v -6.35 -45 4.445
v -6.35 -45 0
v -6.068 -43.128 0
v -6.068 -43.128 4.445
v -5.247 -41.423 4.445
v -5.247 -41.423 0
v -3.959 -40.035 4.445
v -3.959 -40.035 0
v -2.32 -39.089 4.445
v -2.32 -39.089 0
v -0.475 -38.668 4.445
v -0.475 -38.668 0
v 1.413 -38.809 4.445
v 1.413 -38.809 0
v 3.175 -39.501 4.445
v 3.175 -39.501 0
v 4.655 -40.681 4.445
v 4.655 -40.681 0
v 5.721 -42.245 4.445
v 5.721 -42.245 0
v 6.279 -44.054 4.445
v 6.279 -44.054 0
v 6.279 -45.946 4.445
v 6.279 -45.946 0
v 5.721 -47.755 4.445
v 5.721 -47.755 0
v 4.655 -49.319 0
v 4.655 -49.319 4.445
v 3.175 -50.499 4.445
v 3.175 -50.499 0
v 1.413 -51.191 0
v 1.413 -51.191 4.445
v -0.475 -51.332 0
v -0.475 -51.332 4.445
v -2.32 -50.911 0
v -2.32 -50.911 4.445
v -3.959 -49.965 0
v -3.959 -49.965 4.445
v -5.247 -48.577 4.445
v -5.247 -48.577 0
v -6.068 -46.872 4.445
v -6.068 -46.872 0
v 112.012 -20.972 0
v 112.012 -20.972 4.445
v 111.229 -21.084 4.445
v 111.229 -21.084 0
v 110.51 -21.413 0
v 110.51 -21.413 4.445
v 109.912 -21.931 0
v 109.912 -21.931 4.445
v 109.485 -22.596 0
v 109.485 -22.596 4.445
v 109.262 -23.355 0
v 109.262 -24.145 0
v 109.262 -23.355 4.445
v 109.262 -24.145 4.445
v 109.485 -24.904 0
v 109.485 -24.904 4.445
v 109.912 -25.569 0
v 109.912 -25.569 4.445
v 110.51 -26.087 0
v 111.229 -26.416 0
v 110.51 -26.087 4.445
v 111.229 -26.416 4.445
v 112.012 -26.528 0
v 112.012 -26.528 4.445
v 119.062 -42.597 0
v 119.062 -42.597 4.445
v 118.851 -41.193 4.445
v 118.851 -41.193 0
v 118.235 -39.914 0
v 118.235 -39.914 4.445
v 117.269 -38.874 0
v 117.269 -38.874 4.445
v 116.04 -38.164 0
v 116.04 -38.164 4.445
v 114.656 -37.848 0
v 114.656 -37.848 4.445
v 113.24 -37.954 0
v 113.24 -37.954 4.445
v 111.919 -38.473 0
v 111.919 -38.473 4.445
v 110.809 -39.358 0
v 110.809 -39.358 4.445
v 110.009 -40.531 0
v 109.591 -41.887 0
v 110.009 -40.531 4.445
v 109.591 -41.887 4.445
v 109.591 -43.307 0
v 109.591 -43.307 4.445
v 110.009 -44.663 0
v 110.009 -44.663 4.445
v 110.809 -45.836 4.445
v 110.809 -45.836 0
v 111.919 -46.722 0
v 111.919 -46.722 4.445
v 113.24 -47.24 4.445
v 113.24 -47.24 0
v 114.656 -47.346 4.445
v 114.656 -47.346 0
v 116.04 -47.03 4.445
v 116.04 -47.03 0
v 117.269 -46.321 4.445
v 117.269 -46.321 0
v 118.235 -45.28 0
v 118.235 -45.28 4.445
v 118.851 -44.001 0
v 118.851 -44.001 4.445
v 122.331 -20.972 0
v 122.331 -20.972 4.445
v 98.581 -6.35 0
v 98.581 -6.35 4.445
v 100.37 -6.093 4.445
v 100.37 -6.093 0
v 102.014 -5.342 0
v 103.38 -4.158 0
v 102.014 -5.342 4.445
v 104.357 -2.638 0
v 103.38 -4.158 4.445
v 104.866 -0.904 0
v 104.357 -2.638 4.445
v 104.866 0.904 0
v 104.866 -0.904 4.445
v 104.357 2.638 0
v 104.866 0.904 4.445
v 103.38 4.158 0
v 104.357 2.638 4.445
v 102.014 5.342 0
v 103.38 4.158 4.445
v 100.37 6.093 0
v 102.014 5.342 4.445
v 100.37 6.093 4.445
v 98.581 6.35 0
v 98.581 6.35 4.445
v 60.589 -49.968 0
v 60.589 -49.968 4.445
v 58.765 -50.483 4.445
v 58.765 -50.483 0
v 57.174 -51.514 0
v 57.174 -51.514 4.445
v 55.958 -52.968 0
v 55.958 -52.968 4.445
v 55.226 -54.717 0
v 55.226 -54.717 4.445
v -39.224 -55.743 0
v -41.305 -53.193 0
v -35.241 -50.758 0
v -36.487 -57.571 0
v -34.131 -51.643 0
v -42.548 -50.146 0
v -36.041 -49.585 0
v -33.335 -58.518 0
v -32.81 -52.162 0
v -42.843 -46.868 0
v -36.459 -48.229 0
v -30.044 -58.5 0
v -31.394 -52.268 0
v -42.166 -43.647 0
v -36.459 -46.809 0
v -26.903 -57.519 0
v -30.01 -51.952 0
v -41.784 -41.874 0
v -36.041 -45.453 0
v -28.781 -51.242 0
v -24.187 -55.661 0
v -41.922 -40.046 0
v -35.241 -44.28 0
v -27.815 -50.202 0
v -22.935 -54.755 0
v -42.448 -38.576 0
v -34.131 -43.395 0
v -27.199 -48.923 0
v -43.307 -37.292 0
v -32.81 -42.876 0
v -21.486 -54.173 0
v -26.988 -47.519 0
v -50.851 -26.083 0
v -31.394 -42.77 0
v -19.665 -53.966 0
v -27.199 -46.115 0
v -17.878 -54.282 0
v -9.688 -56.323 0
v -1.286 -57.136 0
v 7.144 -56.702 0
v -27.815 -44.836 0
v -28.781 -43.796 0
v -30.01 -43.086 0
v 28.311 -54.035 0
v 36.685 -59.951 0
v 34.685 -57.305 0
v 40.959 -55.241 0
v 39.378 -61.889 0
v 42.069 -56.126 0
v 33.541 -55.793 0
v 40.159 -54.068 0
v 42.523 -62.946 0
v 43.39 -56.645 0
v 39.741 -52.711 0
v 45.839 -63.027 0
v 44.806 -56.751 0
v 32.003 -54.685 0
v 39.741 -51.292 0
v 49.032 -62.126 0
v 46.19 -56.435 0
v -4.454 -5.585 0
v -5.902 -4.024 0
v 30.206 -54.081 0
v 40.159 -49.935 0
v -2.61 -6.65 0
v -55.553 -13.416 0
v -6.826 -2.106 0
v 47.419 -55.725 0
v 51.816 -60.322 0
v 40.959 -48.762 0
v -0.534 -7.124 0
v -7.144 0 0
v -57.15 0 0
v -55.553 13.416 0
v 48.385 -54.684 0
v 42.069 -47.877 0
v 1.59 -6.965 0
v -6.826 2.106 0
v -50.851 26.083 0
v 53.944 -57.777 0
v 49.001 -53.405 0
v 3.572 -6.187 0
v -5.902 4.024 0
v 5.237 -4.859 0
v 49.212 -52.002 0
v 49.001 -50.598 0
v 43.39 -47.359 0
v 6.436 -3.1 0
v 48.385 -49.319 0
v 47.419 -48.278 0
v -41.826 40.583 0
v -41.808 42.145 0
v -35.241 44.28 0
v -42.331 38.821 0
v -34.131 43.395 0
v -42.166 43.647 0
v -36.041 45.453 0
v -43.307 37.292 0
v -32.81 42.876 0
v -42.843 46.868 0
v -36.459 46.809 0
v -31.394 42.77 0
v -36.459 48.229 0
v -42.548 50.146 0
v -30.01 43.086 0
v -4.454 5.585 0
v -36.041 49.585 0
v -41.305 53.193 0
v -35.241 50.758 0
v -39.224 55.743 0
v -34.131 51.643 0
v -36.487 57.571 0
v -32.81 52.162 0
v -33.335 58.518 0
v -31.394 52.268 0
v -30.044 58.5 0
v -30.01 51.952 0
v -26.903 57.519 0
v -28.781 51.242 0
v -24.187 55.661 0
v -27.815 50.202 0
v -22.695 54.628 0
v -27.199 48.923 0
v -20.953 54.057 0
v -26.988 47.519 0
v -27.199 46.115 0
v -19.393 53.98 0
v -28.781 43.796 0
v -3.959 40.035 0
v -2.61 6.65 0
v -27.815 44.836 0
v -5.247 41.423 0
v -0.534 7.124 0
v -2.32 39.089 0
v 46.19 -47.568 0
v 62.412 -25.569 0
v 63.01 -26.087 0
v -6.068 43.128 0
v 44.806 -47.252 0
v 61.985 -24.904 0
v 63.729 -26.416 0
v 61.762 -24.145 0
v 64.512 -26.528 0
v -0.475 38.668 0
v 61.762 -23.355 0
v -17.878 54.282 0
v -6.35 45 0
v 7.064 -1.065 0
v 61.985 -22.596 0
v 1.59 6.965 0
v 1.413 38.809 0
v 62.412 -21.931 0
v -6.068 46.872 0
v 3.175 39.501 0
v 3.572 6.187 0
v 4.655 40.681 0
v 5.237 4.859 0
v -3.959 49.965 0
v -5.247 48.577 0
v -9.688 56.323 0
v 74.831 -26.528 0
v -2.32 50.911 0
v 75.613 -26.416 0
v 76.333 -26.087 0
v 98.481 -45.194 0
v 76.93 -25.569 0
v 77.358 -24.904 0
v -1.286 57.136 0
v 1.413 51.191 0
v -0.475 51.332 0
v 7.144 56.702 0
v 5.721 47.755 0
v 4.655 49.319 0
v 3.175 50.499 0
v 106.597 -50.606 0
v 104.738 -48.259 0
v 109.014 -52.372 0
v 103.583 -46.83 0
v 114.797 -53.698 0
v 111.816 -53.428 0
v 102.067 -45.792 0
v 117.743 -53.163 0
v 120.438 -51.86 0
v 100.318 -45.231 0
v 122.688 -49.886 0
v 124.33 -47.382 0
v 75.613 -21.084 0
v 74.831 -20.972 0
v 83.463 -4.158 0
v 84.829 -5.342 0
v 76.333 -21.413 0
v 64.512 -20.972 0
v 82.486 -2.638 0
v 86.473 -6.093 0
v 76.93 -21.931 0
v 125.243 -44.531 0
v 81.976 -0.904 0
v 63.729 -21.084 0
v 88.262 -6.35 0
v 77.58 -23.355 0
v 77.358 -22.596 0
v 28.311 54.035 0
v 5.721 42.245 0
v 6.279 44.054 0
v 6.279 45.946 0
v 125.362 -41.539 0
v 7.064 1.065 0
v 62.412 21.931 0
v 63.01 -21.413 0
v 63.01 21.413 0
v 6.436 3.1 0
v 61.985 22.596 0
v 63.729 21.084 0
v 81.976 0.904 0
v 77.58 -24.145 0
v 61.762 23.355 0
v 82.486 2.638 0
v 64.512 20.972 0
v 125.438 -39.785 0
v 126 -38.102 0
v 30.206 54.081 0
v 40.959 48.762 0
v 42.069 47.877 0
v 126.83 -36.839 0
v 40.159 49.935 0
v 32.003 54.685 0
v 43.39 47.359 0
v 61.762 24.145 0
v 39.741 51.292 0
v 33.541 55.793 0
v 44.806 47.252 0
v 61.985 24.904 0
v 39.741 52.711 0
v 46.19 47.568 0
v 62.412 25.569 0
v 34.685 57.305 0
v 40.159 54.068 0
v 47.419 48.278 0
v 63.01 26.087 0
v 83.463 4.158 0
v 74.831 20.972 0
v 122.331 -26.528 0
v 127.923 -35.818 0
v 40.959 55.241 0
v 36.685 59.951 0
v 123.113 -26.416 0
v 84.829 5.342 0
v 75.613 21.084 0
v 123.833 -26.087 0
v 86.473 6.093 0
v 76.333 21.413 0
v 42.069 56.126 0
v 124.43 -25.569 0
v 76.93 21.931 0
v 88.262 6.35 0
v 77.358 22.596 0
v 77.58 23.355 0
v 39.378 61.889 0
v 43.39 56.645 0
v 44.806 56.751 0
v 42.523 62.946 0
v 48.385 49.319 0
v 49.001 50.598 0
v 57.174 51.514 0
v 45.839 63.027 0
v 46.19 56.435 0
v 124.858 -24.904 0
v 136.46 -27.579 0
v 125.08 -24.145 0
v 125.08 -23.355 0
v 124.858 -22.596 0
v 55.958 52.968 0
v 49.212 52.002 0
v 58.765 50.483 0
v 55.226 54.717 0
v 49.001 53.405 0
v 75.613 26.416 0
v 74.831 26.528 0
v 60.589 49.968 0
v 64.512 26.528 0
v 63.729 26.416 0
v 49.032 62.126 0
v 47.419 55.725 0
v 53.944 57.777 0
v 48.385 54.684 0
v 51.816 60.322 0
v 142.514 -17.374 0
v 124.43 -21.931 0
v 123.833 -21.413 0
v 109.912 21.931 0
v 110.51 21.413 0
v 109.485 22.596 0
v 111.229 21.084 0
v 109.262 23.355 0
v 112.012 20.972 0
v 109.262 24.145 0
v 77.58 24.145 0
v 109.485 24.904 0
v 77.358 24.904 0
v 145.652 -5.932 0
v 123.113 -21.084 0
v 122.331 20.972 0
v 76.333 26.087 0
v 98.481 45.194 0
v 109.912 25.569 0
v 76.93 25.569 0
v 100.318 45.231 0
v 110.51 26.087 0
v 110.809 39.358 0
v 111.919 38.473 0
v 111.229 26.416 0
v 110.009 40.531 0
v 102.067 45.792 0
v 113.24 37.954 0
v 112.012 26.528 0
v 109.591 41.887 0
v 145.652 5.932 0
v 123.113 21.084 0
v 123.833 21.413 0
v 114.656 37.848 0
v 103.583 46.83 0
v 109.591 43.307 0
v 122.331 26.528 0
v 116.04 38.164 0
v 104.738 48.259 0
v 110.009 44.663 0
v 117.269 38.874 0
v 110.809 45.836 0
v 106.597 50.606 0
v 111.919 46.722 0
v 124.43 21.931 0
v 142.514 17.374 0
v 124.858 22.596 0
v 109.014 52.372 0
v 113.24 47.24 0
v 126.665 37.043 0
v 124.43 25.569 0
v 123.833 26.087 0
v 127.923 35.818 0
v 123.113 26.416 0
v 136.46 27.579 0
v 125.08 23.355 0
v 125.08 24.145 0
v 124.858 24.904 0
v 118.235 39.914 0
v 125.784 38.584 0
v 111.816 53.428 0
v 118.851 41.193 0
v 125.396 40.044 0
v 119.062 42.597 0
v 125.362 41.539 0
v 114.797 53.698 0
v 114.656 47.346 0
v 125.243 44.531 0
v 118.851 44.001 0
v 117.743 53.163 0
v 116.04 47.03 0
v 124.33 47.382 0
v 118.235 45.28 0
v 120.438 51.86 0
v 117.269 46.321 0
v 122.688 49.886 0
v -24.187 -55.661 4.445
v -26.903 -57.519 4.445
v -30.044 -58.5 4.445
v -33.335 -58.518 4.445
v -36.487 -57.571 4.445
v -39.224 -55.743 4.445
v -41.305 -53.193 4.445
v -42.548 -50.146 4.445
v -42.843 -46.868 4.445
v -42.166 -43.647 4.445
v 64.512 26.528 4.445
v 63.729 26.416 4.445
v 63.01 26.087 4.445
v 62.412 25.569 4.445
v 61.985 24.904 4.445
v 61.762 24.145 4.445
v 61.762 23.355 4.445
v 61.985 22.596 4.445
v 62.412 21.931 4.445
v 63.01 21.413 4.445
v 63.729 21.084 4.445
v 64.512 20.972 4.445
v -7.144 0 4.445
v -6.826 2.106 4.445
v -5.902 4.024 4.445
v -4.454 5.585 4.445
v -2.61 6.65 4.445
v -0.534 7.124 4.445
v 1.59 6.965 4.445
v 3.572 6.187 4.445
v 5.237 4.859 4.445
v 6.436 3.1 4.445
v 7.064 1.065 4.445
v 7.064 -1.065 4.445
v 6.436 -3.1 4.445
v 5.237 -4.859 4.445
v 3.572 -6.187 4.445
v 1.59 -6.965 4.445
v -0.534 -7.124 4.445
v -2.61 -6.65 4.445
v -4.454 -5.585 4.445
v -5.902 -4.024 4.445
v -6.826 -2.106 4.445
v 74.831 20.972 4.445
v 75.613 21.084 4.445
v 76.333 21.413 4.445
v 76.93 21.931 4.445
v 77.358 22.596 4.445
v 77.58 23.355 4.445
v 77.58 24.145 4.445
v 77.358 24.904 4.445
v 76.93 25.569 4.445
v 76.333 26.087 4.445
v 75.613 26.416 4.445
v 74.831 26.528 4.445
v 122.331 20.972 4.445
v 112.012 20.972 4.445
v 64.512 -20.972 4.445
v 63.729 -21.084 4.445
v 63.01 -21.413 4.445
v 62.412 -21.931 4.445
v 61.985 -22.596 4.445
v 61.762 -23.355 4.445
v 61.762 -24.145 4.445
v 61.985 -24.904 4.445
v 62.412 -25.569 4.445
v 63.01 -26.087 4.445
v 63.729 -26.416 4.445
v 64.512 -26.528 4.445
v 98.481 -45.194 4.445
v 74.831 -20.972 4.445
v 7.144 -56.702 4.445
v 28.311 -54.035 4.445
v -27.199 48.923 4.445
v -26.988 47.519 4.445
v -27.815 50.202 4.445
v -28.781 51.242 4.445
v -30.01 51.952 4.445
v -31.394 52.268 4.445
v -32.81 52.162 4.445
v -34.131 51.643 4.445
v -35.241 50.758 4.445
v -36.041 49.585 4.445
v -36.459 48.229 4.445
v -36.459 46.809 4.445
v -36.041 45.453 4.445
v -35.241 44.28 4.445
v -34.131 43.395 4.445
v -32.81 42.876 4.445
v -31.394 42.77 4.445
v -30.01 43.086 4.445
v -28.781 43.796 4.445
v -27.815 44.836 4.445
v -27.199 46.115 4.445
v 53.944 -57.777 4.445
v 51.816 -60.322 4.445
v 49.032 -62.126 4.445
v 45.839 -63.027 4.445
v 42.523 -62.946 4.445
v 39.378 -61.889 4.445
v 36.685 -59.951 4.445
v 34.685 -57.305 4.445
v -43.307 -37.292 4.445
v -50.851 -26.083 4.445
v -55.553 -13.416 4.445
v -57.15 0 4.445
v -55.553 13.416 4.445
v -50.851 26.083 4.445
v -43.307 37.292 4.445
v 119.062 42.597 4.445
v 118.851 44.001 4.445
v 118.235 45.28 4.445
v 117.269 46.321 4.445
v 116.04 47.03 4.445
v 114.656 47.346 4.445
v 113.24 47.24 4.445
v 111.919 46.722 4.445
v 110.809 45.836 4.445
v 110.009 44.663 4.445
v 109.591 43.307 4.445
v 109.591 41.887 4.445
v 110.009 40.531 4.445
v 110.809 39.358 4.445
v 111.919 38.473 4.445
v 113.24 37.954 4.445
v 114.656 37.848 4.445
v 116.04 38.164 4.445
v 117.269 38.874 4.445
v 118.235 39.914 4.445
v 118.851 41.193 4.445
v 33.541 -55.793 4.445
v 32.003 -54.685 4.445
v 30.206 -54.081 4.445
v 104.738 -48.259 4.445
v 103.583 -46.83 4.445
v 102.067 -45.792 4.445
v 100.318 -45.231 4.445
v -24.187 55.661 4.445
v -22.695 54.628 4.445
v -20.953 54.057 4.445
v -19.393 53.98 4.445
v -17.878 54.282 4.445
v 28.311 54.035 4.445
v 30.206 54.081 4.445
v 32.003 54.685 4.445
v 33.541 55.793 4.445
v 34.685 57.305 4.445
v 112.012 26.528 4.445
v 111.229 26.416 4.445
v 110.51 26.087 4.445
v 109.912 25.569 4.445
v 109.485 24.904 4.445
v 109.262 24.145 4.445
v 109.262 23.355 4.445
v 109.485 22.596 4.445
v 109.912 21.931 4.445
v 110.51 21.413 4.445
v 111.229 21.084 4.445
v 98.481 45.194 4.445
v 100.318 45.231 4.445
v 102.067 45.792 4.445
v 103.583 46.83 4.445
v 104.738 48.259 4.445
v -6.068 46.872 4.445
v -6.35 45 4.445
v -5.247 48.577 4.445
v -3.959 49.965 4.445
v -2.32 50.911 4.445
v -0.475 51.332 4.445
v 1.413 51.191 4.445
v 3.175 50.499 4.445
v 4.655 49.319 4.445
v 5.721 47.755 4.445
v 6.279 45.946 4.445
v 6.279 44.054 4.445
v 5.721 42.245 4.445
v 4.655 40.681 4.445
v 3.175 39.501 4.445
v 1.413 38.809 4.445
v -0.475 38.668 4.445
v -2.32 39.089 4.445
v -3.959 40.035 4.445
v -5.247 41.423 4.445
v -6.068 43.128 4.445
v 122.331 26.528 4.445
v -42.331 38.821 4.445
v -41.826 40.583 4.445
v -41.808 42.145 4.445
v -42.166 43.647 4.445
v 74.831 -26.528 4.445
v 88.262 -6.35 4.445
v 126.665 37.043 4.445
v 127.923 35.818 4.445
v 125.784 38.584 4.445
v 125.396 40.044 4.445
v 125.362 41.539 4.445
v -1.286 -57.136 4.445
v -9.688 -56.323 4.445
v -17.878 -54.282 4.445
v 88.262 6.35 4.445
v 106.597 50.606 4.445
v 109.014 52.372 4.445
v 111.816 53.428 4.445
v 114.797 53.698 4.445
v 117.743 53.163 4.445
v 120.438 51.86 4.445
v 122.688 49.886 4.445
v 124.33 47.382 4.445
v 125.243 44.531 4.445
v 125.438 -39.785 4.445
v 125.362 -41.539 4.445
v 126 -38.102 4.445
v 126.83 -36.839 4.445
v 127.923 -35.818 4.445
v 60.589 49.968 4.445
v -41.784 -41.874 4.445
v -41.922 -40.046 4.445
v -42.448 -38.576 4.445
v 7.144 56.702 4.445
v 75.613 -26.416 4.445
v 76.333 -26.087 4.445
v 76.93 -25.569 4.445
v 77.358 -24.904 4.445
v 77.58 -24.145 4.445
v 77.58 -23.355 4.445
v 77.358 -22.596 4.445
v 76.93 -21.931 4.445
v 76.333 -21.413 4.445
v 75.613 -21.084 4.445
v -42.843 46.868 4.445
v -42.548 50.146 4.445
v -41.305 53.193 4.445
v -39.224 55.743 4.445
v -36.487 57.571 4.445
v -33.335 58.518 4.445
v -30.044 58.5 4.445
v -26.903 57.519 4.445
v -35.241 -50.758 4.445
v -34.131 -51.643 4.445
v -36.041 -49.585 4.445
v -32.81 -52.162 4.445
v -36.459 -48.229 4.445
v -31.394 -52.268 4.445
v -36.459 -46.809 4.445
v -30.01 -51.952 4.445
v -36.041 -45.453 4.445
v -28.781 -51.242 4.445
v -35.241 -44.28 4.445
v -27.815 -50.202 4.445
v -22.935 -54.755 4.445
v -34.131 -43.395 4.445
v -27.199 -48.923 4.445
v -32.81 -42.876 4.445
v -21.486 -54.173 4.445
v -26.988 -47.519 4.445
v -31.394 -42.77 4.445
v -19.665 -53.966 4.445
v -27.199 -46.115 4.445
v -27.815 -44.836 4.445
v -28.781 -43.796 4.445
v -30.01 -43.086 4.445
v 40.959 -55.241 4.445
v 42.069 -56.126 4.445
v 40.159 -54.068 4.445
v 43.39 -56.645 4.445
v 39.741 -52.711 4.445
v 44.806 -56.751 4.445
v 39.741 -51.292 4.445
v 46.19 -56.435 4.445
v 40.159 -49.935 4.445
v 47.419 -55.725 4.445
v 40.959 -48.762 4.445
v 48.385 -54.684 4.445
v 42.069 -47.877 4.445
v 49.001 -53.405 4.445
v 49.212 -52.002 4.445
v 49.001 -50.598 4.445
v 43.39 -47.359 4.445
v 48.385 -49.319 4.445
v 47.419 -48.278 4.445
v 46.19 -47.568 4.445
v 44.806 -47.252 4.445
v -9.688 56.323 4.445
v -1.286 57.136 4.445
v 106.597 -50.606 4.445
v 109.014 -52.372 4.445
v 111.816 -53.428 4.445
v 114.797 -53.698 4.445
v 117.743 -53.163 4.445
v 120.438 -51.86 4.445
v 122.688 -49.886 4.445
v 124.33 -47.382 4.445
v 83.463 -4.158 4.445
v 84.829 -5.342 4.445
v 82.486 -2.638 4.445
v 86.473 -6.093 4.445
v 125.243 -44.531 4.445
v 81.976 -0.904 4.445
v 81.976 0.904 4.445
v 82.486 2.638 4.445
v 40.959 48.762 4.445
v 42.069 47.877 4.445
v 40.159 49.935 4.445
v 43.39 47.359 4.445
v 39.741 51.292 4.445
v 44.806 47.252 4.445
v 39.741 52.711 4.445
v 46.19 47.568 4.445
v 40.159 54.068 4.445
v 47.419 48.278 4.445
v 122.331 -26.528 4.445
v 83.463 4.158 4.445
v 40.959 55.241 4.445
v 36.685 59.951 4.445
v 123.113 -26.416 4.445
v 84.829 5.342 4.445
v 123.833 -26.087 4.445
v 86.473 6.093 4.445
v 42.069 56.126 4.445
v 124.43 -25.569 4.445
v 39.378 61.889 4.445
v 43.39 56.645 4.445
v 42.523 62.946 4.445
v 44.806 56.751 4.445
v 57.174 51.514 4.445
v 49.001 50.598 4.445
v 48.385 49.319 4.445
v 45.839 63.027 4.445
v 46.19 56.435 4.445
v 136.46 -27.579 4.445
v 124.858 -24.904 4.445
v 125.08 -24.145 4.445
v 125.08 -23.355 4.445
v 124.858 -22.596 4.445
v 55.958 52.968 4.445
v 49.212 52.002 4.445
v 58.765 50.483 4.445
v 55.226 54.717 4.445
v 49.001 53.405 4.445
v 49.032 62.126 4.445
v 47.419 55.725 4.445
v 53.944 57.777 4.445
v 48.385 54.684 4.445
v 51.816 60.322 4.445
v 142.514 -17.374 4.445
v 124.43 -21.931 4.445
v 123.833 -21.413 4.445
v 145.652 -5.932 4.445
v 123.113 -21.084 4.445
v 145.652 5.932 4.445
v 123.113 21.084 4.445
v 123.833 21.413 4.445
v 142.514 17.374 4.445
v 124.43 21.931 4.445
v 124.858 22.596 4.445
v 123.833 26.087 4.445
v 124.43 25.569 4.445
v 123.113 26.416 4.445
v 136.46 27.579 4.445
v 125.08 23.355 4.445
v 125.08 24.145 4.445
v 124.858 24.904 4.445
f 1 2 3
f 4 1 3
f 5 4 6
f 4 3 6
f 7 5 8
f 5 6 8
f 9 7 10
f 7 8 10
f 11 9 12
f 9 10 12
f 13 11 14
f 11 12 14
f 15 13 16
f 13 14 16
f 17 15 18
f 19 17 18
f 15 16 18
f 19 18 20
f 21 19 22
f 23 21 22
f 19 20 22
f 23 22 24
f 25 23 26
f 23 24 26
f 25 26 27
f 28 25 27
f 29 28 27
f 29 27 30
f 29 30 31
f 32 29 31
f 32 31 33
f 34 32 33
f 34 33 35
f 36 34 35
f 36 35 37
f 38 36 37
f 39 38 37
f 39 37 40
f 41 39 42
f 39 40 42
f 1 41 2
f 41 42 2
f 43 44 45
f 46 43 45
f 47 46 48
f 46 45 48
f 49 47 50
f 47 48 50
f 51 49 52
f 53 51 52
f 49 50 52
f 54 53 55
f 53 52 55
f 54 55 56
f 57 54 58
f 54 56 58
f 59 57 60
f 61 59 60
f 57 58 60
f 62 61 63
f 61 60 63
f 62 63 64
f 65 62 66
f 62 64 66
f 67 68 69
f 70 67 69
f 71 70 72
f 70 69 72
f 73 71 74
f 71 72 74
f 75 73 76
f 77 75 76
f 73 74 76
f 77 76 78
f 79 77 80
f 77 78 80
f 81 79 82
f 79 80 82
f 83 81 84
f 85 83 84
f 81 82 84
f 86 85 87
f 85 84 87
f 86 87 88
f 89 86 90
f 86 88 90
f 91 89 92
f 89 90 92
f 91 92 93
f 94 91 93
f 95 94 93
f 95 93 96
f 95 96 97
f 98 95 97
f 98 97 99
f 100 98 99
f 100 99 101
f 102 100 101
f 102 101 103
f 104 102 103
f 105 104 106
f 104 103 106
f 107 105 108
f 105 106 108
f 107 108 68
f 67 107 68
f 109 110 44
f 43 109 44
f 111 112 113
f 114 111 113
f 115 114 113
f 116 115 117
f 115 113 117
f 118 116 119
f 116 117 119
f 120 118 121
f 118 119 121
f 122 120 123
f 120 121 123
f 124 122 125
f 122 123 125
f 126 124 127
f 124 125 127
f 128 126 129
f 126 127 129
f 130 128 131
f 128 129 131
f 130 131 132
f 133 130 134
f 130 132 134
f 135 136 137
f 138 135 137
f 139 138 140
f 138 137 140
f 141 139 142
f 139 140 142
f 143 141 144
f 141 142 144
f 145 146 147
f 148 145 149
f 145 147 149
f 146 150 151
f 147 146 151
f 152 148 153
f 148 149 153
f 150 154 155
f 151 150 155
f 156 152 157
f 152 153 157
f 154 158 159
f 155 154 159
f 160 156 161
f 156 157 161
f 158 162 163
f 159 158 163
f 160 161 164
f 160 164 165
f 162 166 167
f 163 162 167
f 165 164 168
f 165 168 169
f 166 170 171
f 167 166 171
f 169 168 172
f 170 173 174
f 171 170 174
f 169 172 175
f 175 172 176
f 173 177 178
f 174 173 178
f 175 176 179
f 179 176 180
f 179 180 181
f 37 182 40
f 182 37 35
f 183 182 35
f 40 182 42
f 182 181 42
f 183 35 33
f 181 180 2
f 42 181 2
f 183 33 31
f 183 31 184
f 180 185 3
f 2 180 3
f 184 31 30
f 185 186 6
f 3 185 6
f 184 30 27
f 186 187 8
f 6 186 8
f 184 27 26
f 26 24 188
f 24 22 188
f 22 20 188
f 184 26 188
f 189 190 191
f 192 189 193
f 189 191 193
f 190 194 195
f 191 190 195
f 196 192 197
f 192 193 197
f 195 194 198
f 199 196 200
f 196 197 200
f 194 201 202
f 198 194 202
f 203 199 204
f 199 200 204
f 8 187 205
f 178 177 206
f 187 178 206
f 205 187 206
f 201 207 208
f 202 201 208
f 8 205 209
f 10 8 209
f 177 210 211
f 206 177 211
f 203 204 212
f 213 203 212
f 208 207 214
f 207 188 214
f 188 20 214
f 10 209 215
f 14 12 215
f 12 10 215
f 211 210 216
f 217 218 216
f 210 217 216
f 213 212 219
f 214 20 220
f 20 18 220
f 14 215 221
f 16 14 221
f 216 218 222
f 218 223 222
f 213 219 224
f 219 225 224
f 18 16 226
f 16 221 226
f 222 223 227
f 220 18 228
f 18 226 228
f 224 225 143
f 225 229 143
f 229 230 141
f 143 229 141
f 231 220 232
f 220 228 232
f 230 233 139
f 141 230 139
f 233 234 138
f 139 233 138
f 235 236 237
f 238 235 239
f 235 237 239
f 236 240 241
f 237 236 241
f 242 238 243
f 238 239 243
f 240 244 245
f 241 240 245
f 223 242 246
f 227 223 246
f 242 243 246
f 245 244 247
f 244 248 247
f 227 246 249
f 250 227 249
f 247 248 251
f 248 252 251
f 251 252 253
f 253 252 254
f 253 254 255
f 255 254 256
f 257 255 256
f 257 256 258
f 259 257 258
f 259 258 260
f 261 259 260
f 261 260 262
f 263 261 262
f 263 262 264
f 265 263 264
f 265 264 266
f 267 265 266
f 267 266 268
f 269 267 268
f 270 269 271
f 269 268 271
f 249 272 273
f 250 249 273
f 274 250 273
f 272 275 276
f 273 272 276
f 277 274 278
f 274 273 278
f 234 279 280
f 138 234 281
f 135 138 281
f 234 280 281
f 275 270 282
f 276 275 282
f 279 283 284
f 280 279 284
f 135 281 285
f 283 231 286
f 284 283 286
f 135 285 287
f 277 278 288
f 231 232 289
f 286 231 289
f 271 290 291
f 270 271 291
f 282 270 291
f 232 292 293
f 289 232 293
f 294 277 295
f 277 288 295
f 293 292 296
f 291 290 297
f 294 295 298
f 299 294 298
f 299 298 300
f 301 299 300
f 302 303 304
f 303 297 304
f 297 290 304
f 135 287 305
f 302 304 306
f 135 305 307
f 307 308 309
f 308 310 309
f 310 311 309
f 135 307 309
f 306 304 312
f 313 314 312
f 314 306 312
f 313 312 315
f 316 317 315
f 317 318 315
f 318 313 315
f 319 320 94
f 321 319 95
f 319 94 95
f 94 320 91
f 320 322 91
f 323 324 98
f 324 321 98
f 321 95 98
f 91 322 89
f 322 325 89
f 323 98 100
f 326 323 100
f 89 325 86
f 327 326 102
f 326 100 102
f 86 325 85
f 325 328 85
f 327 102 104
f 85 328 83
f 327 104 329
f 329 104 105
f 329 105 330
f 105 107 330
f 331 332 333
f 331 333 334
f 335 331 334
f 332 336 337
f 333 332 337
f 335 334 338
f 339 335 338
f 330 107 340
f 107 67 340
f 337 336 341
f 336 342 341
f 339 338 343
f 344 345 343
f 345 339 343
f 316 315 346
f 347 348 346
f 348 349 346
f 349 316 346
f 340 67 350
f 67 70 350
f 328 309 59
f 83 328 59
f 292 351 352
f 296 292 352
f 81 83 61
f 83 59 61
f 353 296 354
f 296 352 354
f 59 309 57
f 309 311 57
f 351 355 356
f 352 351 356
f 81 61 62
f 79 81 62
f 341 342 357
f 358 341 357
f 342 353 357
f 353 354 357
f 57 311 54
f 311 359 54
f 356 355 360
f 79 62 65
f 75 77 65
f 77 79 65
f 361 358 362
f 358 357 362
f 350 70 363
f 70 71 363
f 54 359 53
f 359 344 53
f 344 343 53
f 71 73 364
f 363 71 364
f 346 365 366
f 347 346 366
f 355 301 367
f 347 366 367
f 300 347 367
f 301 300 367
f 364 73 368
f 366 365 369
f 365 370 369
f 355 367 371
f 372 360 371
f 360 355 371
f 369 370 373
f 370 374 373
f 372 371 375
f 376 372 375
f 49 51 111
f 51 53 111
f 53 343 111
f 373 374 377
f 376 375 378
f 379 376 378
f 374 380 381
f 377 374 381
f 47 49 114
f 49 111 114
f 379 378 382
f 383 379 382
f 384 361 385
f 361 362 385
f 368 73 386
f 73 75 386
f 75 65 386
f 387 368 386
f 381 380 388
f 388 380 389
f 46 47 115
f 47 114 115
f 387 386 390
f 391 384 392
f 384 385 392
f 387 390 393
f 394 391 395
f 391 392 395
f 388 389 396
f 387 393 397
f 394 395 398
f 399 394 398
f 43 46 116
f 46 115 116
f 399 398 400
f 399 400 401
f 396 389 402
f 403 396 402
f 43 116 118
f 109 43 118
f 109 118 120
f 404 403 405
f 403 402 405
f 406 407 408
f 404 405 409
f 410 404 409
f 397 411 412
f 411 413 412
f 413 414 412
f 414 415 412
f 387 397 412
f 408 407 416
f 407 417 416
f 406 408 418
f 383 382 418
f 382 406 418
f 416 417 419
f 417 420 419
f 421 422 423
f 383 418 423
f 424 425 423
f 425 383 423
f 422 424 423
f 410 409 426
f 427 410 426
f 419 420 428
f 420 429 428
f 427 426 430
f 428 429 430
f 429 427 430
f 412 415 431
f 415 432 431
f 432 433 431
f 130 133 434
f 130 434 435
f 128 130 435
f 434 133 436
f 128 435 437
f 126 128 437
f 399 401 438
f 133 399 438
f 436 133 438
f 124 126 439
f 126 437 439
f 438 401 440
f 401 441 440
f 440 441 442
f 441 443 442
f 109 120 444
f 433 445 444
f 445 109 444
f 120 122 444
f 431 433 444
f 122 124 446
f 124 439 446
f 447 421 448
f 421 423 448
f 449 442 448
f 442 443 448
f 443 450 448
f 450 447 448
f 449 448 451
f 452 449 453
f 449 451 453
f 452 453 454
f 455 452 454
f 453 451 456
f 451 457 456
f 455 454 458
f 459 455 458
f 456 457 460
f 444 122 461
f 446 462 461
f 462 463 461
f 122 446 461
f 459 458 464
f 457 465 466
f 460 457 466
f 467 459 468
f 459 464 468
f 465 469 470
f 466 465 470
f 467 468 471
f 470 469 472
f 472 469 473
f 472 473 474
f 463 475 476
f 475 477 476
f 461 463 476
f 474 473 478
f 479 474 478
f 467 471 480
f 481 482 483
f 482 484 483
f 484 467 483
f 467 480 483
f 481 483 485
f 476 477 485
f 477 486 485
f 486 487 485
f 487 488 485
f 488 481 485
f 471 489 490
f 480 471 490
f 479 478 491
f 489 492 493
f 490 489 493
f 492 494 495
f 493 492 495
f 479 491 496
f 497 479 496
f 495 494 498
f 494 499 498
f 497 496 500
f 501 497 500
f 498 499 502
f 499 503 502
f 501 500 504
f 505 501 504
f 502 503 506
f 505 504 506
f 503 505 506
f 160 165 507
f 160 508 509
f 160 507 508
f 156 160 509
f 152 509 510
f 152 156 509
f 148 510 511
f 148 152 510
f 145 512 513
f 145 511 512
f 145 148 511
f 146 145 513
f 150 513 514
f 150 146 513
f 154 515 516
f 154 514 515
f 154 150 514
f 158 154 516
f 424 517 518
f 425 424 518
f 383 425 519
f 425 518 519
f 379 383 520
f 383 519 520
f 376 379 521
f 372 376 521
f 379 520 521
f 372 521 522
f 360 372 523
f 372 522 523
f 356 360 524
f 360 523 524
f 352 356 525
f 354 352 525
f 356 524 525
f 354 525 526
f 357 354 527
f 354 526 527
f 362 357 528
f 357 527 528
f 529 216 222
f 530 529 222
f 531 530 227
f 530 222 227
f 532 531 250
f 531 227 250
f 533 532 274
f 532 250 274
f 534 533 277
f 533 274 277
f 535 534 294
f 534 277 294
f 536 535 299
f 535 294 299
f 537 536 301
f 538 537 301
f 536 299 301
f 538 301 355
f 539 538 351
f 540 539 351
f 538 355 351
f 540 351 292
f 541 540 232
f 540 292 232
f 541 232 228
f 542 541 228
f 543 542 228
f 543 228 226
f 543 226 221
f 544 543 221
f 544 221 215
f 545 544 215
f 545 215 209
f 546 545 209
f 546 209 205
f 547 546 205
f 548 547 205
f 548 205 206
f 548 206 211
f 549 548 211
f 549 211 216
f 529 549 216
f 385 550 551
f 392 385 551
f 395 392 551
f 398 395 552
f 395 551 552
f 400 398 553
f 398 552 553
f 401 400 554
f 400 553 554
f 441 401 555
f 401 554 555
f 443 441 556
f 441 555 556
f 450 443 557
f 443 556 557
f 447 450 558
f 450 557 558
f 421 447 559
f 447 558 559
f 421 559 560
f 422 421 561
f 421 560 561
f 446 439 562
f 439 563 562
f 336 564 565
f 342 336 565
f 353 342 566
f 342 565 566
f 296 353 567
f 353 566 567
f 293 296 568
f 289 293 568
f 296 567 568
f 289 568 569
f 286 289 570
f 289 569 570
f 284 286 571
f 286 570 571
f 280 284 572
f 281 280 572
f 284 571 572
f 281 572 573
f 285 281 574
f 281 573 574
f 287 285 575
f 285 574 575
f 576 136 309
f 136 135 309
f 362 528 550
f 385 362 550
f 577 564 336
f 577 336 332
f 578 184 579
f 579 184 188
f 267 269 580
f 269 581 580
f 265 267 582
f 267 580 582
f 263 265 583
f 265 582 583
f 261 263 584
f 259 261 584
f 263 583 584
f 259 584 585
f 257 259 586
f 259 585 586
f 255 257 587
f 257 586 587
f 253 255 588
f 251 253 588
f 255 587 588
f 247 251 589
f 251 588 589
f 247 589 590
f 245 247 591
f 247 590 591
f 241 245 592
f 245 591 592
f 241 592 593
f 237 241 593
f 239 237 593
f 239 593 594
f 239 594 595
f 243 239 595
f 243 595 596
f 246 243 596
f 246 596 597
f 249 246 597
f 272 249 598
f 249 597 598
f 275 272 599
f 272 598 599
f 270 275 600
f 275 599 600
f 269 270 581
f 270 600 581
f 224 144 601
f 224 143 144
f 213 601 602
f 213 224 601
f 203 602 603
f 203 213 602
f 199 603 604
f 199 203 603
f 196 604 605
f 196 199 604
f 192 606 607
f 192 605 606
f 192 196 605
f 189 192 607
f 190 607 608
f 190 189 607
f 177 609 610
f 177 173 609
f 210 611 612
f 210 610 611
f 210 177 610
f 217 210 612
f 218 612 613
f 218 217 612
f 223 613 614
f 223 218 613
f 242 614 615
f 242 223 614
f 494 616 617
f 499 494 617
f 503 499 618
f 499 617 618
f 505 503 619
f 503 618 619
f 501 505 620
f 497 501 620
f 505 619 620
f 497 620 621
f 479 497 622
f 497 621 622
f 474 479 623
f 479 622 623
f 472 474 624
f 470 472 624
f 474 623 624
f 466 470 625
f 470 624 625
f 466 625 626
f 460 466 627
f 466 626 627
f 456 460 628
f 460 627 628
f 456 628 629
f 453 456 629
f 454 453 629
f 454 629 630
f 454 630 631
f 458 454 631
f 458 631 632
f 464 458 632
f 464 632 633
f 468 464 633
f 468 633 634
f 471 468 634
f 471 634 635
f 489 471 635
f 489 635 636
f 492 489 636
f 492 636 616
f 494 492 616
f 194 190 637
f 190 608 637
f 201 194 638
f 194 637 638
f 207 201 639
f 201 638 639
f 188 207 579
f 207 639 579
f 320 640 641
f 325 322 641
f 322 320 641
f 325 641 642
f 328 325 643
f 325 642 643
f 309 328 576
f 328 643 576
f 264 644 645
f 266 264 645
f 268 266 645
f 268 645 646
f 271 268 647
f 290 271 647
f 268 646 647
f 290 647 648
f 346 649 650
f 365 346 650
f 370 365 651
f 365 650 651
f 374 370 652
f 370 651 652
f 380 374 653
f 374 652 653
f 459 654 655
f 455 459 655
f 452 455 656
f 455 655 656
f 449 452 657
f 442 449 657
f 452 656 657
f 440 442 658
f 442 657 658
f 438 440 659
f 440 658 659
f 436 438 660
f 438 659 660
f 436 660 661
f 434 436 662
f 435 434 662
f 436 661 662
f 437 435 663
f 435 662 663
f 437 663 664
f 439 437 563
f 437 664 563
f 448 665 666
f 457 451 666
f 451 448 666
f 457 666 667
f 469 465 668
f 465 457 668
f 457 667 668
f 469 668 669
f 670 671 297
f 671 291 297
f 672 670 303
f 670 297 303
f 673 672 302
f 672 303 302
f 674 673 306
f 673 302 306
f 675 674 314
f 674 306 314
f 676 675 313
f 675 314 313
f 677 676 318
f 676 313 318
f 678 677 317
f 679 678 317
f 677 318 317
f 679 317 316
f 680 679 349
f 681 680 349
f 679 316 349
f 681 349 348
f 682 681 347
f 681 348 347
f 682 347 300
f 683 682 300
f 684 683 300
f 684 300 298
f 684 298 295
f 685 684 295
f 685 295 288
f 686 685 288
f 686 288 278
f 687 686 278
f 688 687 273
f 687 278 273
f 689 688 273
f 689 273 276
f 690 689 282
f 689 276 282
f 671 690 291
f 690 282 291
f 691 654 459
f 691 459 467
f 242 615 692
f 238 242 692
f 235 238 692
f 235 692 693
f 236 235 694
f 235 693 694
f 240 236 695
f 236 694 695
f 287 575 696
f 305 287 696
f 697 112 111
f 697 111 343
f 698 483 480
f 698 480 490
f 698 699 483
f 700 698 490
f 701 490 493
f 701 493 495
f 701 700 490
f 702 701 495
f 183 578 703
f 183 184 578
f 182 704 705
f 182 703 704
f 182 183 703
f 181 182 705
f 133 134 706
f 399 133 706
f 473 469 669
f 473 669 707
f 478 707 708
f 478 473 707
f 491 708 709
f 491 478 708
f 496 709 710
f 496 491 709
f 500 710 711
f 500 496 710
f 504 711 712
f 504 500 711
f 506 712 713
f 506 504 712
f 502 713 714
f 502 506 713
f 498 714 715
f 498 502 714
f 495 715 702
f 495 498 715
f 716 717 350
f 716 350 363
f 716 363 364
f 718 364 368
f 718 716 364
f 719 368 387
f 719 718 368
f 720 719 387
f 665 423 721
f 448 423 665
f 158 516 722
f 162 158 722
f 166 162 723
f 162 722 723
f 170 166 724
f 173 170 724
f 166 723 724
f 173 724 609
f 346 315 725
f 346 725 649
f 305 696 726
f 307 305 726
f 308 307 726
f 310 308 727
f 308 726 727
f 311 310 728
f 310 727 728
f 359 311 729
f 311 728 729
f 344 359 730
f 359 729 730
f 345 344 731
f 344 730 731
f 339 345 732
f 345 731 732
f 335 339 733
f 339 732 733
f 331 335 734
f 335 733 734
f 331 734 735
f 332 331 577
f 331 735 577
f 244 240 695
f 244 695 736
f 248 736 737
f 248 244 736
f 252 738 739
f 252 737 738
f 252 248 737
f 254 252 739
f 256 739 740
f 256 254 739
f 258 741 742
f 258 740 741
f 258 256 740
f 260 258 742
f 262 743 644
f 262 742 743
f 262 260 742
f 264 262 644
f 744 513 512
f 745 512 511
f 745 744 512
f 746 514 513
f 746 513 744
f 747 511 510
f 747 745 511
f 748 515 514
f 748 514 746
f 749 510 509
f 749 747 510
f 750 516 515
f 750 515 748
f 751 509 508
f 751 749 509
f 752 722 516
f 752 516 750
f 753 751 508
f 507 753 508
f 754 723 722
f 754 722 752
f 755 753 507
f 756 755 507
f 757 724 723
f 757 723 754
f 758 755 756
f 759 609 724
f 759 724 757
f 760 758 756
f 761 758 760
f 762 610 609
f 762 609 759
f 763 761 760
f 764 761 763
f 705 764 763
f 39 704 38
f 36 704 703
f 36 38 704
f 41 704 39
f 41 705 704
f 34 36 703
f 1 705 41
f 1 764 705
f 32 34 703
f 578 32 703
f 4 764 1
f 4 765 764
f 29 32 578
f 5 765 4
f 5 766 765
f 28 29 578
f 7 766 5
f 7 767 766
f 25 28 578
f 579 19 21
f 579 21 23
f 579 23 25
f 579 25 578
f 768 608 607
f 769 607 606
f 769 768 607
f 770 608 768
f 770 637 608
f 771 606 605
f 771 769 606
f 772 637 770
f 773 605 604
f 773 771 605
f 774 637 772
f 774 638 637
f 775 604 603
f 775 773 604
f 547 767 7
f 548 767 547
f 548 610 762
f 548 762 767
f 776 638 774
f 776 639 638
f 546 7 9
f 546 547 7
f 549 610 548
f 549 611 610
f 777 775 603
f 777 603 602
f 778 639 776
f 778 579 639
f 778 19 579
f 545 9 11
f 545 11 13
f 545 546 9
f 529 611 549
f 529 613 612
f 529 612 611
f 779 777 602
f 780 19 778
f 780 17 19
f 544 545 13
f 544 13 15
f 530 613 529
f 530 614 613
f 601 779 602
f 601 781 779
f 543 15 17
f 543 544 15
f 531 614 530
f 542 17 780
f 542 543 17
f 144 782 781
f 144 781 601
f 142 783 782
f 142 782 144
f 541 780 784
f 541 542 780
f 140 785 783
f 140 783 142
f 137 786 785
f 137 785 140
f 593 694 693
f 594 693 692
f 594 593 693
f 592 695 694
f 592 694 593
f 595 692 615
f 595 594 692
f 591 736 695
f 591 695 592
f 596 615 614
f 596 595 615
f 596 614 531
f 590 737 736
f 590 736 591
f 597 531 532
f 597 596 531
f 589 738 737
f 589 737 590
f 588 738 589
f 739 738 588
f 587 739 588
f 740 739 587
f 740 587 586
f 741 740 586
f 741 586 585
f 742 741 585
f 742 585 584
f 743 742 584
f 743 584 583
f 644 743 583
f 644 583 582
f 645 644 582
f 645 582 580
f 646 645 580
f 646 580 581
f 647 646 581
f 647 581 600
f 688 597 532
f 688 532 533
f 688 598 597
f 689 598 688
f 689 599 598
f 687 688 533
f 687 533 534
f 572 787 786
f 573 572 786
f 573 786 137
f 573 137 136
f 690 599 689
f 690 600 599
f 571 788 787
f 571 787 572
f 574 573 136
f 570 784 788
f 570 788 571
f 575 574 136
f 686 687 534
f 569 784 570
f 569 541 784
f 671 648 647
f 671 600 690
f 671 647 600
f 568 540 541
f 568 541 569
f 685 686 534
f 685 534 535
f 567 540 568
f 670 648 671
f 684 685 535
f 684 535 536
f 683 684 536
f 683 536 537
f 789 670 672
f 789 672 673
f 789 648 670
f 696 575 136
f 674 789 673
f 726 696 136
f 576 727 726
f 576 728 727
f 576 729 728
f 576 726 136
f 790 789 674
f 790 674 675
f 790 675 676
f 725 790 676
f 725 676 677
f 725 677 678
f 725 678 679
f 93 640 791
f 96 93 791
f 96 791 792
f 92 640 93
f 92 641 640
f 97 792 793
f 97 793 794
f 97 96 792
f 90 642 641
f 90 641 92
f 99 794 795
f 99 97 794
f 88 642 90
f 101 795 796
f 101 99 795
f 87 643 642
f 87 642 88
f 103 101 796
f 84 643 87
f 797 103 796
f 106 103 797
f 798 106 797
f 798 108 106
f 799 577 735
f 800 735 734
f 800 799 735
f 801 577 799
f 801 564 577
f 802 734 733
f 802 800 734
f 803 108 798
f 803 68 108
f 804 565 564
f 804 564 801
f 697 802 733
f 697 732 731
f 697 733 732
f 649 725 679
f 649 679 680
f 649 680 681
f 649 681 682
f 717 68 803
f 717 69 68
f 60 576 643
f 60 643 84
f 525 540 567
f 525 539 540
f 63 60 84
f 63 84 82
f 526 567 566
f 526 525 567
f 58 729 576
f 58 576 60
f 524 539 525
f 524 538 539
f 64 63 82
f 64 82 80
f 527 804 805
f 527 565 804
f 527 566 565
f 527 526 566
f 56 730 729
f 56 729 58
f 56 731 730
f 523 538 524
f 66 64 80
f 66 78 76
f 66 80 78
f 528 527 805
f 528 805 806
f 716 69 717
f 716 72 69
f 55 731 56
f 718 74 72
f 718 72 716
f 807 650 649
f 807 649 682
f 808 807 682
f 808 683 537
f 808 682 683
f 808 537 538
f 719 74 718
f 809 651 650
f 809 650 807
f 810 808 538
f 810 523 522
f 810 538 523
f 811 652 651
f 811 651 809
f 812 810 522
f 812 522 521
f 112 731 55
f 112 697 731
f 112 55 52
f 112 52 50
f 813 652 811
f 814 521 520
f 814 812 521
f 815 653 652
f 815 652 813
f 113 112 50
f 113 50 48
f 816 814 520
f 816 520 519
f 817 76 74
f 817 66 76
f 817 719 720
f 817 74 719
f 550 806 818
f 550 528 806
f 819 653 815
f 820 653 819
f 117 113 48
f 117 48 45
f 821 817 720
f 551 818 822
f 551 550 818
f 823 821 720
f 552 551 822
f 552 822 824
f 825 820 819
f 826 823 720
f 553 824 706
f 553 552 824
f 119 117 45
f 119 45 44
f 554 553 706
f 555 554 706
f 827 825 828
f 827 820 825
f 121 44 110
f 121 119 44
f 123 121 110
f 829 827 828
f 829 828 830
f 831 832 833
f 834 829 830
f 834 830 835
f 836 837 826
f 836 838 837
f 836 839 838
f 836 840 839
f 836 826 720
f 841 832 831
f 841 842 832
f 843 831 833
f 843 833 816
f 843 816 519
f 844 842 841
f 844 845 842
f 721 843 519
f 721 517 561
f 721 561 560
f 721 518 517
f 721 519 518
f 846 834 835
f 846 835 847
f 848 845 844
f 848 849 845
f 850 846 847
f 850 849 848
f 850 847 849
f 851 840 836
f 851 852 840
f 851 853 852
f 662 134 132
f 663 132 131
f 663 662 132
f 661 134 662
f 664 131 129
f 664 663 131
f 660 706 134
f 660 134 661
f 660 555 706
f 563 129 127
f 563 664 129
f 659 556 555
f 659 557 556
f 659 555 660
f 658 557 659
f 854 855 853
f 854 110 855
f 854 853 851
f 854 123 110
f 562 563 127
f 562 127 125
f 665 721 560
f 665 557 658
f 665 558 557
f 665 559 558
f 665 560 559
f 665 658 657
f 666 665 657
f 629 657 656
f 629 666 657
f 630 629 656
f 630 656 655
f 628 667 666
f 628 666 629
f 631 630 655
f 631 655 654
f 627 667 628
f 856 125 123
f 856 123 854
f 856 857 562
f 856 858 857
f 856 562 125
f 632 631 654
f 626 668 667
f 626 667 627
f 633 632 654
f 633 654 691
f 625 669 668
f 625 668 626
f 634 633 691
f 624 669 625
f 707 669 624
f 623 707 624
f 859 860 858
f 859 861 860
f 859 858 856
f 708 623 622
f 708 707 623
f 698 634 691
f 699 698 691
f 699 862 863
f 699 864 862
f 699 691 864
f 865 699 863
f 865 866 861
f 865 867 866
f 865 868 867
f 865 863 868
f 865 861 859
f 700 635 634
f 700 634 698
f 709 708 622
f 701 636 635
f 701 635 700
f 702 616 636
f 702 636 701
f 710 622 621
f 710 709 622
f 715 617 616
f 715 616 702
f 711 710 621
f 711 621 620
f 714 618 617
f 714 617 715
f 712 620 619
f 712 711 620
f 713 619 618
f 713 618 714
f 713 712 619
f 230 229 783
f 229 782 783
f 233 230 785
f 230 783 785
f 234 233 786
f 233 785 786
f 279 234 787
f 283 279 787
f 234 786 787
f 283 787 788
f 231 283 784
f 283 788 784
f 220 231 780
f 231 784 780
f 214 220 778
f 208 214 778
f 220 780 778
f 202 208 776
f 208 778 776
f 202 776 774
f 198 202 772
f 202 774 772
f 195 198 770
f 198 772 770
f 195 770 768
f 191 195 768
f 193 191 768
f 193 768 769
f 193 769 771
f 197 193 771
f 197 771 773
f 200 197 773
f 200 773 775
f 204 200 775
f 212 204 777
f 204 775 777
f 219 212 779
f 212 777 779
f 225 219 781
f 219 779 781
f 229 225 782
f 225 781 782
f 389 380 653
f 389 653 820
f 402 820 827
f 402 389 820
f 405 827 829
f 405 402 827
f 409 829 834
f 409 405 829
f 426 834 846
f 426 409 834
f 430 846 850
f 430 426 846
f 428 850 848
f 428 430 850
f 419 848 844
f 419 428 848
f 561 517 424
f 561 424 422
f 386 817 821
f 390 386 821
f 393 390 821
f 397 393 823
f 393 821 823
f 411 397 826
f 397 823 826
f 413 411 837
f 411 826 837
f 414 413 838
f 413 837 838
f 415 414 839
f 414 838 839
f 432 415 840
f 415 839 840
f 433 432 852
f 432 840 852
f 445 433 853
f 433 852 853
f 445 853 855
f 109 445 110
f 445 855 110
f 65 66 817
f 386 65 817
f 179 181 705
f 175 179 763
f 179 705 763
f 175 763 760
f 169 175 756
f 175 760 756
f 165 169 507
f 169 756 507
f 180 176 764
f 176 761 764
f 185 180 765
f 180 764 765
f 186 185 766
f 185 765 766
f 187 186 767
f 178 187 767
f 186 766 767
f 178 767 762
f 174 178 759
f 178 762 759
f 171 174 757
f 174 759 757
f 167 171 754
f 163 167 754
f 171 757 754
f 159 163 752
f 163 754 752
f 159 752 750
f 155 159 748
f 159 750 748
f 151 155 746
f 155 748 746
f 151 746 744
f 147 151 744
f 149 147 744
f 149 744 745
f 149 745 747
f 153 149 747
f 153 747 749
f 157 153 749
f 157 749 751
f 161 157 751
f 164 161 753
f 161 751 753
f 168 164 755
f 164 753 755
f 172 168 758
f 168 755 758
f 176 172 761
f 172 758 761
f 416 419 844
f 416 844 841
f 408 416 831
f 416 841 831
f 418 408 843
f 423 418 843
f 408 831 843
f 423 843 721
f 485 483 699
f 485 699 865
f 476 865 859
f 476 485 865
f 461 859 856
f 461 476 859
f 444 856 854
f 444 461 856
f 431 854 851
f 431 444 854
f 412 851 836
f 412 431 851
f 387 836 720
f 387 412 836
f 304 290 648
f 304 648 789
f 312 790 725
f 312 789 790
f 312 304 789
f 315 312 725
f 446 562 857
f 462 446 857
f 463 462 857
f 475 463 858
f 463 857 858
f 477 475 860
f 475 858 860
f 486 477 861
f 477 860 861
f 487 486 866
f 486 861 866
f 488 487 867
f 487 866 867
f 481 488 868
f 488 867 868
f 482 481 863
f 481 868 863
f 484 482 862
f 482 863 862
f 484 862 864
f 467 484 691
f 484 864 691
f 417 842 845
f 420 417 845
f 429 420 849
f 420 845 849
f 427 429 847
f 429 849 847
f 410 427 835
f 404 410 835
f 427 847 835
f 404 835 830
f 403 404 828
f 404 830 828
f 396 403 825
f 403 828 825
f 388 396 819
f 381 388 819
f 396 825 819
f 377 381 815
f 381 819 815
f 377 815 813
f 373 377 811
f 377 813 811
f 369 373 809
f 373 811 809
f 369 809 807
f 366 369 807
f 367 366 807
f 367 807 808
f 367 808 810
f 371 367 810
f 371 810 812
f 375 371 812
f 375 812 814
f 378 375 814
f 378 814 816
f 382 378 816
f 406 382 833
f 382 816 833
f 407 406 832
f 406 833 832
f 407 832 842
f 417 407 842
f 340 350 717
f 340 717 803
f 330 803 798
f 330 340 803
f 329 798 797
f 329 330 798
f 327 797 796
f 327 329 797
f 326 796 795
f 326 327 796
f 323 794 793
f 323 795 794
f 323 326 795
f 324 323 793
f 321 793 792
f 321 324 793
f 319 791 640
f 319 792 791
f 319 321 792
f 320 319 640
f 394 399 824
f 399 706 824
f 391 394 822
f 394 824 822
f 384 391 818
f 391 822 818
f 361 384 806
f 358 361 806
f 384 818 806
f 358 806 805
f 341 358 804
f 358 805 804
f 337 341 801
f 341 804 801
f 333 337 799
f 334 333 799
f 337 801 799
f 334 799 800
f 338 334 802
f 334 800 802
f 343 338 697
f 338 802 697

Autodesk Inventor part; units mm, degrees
ref_plane "YZ Plane" through (0, 0, 0) normal (1, 0, 0) x (0, 1, 0)
ref_plane "XZ Plane" through (0, 0, 0) normal (0, 1, 0) x (-1, 0, 0)
ref_plane "XY Plane" through (0, 0, 0) normal (0, 0, 1) x (1, 0, 0)
sketch "Boceto1" plane through (0, 0, 0) normal (0, 0, 1) x (1, 0, 0)
  circle A0 centre (0, 0) radius 57.15
  circle A1 centre (101.6, 0) radius 44.45
  circle A2 centre (-31.75, 47.519) radius 11.1125
  circle A3 centre (-31.75, -47.519) radius 11.1125
  circle A4 centre (114.3, 42.5971) radius 11.1125
  circle A5 centre (114.3, -42.5971) radius 11.1125
  line L0 (7.1437, 56.7018) -> (107.1562, 44.1014)
  circle A6 centre (44.45, 52.0016) radius 11.1125
  line L1 (7.1437, -56.7018) -> (107.1562, -44.1014)
  circle A7 centre (44.45, -52.0016) radius 11.1125
  dimension "d0" = 114.3
  dimension "d1" = 88.9
  dimension "d2" = 203.2
  dimension "d3" = 22.225
  dimension "d4" = 22.225
  dimension "d7" = 22.225
  dimension "d8" = 22.225
  dimension "d11" = 22.225
  dimension "d13" = 0
  dimension "d14" = 22.225
  dimension "d27" = 12.7
  dimension "d28" = 12.7
  dimension "d29" = 44.45
  dimension "d30" = 44.45
  dimension "d31" = 31.75
  dimension "d32" = 31.75
extrude "Extrusión1" add sketch "Boceto1" along normal blind 4.445
sketch "Boceto2" plane through (0, 0, 4.445) normal (0, 0, 1) x (1, 0, 0)
  arc A0 (-21.9537, 52.7651) -> (-40.3458, 40.4764) centre (-31.75, 47.519) ccw projected
  circle A1 centre (-31.75, 47.519) radius 4.7625
  arc A2 (-40.3458, -40.4764) -> (-21.9537, -52.7651) centre (-31.75, -47.519) ccw projected
  circle A3 centre (-31.75, -47.519) radius 4.7625
  arc A4 (33.4247, -53.3907) -> (55.4753, -50.6125) centre (44.45, -52.0016) ccw projected
  circle A5 centre (44.45, -52.0016) radius 4.7625
  arc A6 (55.4753, 50.6125) -> (33.4247, 53.3907) centre (44.45, 52.0016) ccw projected
  circle A7 centre (44.45, 52.0016) radius 4.7625
  arc A8 (124.4689, 38.1158) -> (103.3657, 44.5789) centre (114.3, 42.5971) ccw projected
  circle A9 centre (114.3, 42.5971) radius 4.7625
  arc A10 (103.3657, -44.5789) -> (124.4689, -38.1158) centre (114.3, -42.5971) ccw projected
  circle A11 centre (114.3, -42.5971) radius 4.7625
  point P0 (0, 0)
  dimension "d18" = 9.525
  dimension "d19" = 9.525
  dimension "d20" = 9.525
  dimension "d21" = 9.525
  dimension "d22" = 9.525
  dimension "d23" = 9.525
extrude "Extrusión2" cut sketch "Boceto2" against normal up to surface (4.445 mm away)
fillet "Empalme1" radius 6.35 12 edges at (-21.9537, -52.7651, 2.2225) (-40.3458, -40.4764, 2.2225) (33.4247, -53.3907, 2.2225) (55.4753, -50.6125, 2.2225) (124.4689, -38.1158, 2.2225) (-40.3458, 40.4764, 2.2225) (-21.9537, 52.7651, 2.2225) (33.4247, 53.3907, 2.2225) (55.4753, 50.6125, 2.2225) (103.3657, 44.5789, 2.2225) (124.4689, 38.1158, 2.2225) (103.3657, -44.5789, 2.2225)
sketch "Boceto3" plane through (0, 0, 0) normal (0, 0, -1) x (-1, 0, 0)
  circle A0 centre (0, 0) radius 7.1437
  circle A1 centre (0, -45) radius 6.35
  circle A2 centre (0, 45) radius 6.35
  line L0 (0, -45) -> (0, 0)
  line L1 (0, 0) -> (0, 45)
  dimension "d33" = 14.2875
  dimension "d34" = 12.7
  dimension "d35" = 12.7
  dimension "d36" = 45
  dimension "d37" = 45
extrude "Extrusión3" cut sketch "Boceto3" against normal up to surface (4.445 mm away)
sketch "Boceto4" plane through (0, 0, 4.445) normal (0, 0, 1) x (1, 0, 0)
  circle A0 centre (93.4212, 0) radius 6.35
  line L0 (65.4212, -28) -> (121.4212, -28)
  line L1 (121.4212, -28) -> (121.4212, 28)
  line L2 (121.4212, 28) -> (65.4212, 28)
  line L3 (65.4212, 28) -> (65.4212, -28)
  line L4 (69.6712, -23.75) -> (117.1712, -23.75)
  line L5 (117.1712, -23.75) -> (117.1712, 23.75)
  line L6 (117.1712, 23.75) -> (69.6712, 23.75)
  line L7 (69.6712, 23.75) -> (69.6712, -23.75)
  circle A1 centre (74.8306, -23.75) radius 2.7781
  circle A2 centre (112.0118, -23.75) radius 2.7781
  circle A3 centre (122.3306, -23.75) radius 2.7781
  circle A4 centre (64.5118, -23.75) radius 2.7781
  line L8 (64.5118, -26.5281) -> (74.8306, -26.5281)
  line L9 (64.5118, -20.9719) -> (74.8306, -20.9719)
  line L10 (112.0118, -26.5281) -> (122.3306, -26.5281)
  line L11 (122.3306, -20.9719) -> (112.0118, -20.9719)
  circle A5 centre (74.8306, 23.75) radius 2.7781
  circle A6 centre (64.5118, 23.75) radius 2.7781
  line L12 (64.5118, 20.9719) -> (74.8306, 20.9719)
  line L13 (64.5118, 26.5281) -> (74.8306, 26.5281)
  circle A7 centre (112.0118, 23.75) radius 2.7781
  circle A8 centre (122.3306, 23.75) radius 2.7781
  line L14 (112.0118, 20.9719) -> (122.3306, 20.9719)
  line L15 (112.0118, 26.5281) -> (122.3306, 26.5281)
  circle A9 centre (98.5806, 0) radius 6.35
  circle A10 centre (88.2618, 0) radius 6.35
  line L16 (98.5806, 6.35) -> (88.2618, 6.35)
  line L17 (98.5806, -6.35) -> (88.2618, -6.35)
  point P0 (0, 0)
  dimension "d40" = 12.7
  dimension "d41" = 56
  dimension "d42" = 56
  dimension "d43" = 28
  dimension "d44" = 28
  dimension "d45" = 0
  dimension "d46" = 93.4212
  dimension "d47" = 47.5
  dimension "d48" = 47.5
  dimension "d49" = 23.75
  dimension "d50" = 23.75
  dimension "d57" = 5.5563
  dimension "d58" = 5.1594
  dimension "d59" = 5.5563
  dimension "d60" = 5.5563
  dimension "d61" = 5.1594
  dimension "d62" = 5.1594
  dimension "d63" = 5.5563
  dimension "d64" = 5.1594
  dimension "d65" = 0
  dimension "d66" = 5.5563
  dimension "d67" = 5.5563
  dimension "d68" = 5.1594
  dimension "d69" = 5.1594
  dimension "d70" = 0
  dimension "d71" = 5.5563
  dimension "d72" = 5.5563
  dimension "d73" = 5.1594
  dimension "d74" = 5.1594
  dimension "d75" = 0
  dimension "d78" = 12.7
  dimension "d79" = 12.7
  dimension "d80" = 5.1594
  dimension "d81" = 5.1594
extrude "Extrusión4" cut sketch "Boceto4" against normal up to next contours A0 A9 A10 | A0 A9 | A9 A10 A0 | A0 L16 A9 | A9 L17 A0 | A0 A10 A9 | A0 A10 L16 | A10 A9 | A9 A10 A0 | L17 A10 A0 | A0 A10 | L8 A4 L3 | L3 A4 L9 L7 L4 A1 L8 | L10 A2 L4 L5 L11 L1 A3 | L1 A3 L10 | A4 L3 | L3 A4 | A1 L4 | A3 L1 | L1 A3 | A2 L4 | A4 L9 L3 | L4 A1 | L4 L7 L9 A1 | L1 L11 A3 | A2 L11 L5 L4 | L4 A2 | L12 A6 L3 | L3 A6 L13 A5 L6 L7 L12 | L14 L5 L6 A7 L15 L1 A8 | L1 A8 L14 | A6 L3 | L3 A6 | L7 L6 A5 L12 | A8 L1 | L1 A8 | L14 A7 L6 L5 | A6 L13 L3 | A5 L6 | L1 L15 A8 | A7 L6 | A5 L6 | L6 A7
equation "\"d16\" = t"
equation "\"d18\" = Q"
equation "\"d19\" = Q"
equation "\"d20\" = Q"
equation "\"d21\" = Q"
equation "\"d22\" = Q"
equation "\"d23\" = Q"
equation "\"d33\" = DF"
equation "\"d34\" = NF"
equation "\"d35\" = NF"
equation "\"d36\" = 0.5 * JF"
equation "\"d37\" = 0.5 * JF"
equation "\"d40\" = DM"
equation "\"d41\" = AM"
equation "\"d42\" = AM"
equation "\"d43\" = 0.5 * AM"
equation "\"d44\" = 0.5 * AM"
equation "\"d46\" = CM"
equation "\"d47\" = BM"
equation "\"d48\" = BM"
equation "\"d49\" = 0.5 * BM"
equation "\"d50\" = 0.5 * BM"
equation "\"d57\" = NM"
equation "\"d59\" = NM"
equation "\"d60\" = NM"
equation "\"d63\" = NM"
equation "\"d66\" = NM"
equation "\"d67\" = NM"
equation "\"d71\" = NM"
equation "\"d72\" = NM"
equation "\"d78\" = DM"
equation "\"d79\" = DM"
equation "\"t\" = 4.445"
equation "\"Q\" = 9.525"
equation "\"DF\" = 14.2875"
equation "\"NF\" = 12.7"
equation "\"DM\" = 12.7"
equation "\"NM\" = 5.55625"
equation "\"CM\" = 93.4212"
equation "\"AM\" = 56"
equation "\"BM\" = 47.5"
equation "\"JF\" = 90"
properties part number "SIDE REDUCTION PLATE I"
